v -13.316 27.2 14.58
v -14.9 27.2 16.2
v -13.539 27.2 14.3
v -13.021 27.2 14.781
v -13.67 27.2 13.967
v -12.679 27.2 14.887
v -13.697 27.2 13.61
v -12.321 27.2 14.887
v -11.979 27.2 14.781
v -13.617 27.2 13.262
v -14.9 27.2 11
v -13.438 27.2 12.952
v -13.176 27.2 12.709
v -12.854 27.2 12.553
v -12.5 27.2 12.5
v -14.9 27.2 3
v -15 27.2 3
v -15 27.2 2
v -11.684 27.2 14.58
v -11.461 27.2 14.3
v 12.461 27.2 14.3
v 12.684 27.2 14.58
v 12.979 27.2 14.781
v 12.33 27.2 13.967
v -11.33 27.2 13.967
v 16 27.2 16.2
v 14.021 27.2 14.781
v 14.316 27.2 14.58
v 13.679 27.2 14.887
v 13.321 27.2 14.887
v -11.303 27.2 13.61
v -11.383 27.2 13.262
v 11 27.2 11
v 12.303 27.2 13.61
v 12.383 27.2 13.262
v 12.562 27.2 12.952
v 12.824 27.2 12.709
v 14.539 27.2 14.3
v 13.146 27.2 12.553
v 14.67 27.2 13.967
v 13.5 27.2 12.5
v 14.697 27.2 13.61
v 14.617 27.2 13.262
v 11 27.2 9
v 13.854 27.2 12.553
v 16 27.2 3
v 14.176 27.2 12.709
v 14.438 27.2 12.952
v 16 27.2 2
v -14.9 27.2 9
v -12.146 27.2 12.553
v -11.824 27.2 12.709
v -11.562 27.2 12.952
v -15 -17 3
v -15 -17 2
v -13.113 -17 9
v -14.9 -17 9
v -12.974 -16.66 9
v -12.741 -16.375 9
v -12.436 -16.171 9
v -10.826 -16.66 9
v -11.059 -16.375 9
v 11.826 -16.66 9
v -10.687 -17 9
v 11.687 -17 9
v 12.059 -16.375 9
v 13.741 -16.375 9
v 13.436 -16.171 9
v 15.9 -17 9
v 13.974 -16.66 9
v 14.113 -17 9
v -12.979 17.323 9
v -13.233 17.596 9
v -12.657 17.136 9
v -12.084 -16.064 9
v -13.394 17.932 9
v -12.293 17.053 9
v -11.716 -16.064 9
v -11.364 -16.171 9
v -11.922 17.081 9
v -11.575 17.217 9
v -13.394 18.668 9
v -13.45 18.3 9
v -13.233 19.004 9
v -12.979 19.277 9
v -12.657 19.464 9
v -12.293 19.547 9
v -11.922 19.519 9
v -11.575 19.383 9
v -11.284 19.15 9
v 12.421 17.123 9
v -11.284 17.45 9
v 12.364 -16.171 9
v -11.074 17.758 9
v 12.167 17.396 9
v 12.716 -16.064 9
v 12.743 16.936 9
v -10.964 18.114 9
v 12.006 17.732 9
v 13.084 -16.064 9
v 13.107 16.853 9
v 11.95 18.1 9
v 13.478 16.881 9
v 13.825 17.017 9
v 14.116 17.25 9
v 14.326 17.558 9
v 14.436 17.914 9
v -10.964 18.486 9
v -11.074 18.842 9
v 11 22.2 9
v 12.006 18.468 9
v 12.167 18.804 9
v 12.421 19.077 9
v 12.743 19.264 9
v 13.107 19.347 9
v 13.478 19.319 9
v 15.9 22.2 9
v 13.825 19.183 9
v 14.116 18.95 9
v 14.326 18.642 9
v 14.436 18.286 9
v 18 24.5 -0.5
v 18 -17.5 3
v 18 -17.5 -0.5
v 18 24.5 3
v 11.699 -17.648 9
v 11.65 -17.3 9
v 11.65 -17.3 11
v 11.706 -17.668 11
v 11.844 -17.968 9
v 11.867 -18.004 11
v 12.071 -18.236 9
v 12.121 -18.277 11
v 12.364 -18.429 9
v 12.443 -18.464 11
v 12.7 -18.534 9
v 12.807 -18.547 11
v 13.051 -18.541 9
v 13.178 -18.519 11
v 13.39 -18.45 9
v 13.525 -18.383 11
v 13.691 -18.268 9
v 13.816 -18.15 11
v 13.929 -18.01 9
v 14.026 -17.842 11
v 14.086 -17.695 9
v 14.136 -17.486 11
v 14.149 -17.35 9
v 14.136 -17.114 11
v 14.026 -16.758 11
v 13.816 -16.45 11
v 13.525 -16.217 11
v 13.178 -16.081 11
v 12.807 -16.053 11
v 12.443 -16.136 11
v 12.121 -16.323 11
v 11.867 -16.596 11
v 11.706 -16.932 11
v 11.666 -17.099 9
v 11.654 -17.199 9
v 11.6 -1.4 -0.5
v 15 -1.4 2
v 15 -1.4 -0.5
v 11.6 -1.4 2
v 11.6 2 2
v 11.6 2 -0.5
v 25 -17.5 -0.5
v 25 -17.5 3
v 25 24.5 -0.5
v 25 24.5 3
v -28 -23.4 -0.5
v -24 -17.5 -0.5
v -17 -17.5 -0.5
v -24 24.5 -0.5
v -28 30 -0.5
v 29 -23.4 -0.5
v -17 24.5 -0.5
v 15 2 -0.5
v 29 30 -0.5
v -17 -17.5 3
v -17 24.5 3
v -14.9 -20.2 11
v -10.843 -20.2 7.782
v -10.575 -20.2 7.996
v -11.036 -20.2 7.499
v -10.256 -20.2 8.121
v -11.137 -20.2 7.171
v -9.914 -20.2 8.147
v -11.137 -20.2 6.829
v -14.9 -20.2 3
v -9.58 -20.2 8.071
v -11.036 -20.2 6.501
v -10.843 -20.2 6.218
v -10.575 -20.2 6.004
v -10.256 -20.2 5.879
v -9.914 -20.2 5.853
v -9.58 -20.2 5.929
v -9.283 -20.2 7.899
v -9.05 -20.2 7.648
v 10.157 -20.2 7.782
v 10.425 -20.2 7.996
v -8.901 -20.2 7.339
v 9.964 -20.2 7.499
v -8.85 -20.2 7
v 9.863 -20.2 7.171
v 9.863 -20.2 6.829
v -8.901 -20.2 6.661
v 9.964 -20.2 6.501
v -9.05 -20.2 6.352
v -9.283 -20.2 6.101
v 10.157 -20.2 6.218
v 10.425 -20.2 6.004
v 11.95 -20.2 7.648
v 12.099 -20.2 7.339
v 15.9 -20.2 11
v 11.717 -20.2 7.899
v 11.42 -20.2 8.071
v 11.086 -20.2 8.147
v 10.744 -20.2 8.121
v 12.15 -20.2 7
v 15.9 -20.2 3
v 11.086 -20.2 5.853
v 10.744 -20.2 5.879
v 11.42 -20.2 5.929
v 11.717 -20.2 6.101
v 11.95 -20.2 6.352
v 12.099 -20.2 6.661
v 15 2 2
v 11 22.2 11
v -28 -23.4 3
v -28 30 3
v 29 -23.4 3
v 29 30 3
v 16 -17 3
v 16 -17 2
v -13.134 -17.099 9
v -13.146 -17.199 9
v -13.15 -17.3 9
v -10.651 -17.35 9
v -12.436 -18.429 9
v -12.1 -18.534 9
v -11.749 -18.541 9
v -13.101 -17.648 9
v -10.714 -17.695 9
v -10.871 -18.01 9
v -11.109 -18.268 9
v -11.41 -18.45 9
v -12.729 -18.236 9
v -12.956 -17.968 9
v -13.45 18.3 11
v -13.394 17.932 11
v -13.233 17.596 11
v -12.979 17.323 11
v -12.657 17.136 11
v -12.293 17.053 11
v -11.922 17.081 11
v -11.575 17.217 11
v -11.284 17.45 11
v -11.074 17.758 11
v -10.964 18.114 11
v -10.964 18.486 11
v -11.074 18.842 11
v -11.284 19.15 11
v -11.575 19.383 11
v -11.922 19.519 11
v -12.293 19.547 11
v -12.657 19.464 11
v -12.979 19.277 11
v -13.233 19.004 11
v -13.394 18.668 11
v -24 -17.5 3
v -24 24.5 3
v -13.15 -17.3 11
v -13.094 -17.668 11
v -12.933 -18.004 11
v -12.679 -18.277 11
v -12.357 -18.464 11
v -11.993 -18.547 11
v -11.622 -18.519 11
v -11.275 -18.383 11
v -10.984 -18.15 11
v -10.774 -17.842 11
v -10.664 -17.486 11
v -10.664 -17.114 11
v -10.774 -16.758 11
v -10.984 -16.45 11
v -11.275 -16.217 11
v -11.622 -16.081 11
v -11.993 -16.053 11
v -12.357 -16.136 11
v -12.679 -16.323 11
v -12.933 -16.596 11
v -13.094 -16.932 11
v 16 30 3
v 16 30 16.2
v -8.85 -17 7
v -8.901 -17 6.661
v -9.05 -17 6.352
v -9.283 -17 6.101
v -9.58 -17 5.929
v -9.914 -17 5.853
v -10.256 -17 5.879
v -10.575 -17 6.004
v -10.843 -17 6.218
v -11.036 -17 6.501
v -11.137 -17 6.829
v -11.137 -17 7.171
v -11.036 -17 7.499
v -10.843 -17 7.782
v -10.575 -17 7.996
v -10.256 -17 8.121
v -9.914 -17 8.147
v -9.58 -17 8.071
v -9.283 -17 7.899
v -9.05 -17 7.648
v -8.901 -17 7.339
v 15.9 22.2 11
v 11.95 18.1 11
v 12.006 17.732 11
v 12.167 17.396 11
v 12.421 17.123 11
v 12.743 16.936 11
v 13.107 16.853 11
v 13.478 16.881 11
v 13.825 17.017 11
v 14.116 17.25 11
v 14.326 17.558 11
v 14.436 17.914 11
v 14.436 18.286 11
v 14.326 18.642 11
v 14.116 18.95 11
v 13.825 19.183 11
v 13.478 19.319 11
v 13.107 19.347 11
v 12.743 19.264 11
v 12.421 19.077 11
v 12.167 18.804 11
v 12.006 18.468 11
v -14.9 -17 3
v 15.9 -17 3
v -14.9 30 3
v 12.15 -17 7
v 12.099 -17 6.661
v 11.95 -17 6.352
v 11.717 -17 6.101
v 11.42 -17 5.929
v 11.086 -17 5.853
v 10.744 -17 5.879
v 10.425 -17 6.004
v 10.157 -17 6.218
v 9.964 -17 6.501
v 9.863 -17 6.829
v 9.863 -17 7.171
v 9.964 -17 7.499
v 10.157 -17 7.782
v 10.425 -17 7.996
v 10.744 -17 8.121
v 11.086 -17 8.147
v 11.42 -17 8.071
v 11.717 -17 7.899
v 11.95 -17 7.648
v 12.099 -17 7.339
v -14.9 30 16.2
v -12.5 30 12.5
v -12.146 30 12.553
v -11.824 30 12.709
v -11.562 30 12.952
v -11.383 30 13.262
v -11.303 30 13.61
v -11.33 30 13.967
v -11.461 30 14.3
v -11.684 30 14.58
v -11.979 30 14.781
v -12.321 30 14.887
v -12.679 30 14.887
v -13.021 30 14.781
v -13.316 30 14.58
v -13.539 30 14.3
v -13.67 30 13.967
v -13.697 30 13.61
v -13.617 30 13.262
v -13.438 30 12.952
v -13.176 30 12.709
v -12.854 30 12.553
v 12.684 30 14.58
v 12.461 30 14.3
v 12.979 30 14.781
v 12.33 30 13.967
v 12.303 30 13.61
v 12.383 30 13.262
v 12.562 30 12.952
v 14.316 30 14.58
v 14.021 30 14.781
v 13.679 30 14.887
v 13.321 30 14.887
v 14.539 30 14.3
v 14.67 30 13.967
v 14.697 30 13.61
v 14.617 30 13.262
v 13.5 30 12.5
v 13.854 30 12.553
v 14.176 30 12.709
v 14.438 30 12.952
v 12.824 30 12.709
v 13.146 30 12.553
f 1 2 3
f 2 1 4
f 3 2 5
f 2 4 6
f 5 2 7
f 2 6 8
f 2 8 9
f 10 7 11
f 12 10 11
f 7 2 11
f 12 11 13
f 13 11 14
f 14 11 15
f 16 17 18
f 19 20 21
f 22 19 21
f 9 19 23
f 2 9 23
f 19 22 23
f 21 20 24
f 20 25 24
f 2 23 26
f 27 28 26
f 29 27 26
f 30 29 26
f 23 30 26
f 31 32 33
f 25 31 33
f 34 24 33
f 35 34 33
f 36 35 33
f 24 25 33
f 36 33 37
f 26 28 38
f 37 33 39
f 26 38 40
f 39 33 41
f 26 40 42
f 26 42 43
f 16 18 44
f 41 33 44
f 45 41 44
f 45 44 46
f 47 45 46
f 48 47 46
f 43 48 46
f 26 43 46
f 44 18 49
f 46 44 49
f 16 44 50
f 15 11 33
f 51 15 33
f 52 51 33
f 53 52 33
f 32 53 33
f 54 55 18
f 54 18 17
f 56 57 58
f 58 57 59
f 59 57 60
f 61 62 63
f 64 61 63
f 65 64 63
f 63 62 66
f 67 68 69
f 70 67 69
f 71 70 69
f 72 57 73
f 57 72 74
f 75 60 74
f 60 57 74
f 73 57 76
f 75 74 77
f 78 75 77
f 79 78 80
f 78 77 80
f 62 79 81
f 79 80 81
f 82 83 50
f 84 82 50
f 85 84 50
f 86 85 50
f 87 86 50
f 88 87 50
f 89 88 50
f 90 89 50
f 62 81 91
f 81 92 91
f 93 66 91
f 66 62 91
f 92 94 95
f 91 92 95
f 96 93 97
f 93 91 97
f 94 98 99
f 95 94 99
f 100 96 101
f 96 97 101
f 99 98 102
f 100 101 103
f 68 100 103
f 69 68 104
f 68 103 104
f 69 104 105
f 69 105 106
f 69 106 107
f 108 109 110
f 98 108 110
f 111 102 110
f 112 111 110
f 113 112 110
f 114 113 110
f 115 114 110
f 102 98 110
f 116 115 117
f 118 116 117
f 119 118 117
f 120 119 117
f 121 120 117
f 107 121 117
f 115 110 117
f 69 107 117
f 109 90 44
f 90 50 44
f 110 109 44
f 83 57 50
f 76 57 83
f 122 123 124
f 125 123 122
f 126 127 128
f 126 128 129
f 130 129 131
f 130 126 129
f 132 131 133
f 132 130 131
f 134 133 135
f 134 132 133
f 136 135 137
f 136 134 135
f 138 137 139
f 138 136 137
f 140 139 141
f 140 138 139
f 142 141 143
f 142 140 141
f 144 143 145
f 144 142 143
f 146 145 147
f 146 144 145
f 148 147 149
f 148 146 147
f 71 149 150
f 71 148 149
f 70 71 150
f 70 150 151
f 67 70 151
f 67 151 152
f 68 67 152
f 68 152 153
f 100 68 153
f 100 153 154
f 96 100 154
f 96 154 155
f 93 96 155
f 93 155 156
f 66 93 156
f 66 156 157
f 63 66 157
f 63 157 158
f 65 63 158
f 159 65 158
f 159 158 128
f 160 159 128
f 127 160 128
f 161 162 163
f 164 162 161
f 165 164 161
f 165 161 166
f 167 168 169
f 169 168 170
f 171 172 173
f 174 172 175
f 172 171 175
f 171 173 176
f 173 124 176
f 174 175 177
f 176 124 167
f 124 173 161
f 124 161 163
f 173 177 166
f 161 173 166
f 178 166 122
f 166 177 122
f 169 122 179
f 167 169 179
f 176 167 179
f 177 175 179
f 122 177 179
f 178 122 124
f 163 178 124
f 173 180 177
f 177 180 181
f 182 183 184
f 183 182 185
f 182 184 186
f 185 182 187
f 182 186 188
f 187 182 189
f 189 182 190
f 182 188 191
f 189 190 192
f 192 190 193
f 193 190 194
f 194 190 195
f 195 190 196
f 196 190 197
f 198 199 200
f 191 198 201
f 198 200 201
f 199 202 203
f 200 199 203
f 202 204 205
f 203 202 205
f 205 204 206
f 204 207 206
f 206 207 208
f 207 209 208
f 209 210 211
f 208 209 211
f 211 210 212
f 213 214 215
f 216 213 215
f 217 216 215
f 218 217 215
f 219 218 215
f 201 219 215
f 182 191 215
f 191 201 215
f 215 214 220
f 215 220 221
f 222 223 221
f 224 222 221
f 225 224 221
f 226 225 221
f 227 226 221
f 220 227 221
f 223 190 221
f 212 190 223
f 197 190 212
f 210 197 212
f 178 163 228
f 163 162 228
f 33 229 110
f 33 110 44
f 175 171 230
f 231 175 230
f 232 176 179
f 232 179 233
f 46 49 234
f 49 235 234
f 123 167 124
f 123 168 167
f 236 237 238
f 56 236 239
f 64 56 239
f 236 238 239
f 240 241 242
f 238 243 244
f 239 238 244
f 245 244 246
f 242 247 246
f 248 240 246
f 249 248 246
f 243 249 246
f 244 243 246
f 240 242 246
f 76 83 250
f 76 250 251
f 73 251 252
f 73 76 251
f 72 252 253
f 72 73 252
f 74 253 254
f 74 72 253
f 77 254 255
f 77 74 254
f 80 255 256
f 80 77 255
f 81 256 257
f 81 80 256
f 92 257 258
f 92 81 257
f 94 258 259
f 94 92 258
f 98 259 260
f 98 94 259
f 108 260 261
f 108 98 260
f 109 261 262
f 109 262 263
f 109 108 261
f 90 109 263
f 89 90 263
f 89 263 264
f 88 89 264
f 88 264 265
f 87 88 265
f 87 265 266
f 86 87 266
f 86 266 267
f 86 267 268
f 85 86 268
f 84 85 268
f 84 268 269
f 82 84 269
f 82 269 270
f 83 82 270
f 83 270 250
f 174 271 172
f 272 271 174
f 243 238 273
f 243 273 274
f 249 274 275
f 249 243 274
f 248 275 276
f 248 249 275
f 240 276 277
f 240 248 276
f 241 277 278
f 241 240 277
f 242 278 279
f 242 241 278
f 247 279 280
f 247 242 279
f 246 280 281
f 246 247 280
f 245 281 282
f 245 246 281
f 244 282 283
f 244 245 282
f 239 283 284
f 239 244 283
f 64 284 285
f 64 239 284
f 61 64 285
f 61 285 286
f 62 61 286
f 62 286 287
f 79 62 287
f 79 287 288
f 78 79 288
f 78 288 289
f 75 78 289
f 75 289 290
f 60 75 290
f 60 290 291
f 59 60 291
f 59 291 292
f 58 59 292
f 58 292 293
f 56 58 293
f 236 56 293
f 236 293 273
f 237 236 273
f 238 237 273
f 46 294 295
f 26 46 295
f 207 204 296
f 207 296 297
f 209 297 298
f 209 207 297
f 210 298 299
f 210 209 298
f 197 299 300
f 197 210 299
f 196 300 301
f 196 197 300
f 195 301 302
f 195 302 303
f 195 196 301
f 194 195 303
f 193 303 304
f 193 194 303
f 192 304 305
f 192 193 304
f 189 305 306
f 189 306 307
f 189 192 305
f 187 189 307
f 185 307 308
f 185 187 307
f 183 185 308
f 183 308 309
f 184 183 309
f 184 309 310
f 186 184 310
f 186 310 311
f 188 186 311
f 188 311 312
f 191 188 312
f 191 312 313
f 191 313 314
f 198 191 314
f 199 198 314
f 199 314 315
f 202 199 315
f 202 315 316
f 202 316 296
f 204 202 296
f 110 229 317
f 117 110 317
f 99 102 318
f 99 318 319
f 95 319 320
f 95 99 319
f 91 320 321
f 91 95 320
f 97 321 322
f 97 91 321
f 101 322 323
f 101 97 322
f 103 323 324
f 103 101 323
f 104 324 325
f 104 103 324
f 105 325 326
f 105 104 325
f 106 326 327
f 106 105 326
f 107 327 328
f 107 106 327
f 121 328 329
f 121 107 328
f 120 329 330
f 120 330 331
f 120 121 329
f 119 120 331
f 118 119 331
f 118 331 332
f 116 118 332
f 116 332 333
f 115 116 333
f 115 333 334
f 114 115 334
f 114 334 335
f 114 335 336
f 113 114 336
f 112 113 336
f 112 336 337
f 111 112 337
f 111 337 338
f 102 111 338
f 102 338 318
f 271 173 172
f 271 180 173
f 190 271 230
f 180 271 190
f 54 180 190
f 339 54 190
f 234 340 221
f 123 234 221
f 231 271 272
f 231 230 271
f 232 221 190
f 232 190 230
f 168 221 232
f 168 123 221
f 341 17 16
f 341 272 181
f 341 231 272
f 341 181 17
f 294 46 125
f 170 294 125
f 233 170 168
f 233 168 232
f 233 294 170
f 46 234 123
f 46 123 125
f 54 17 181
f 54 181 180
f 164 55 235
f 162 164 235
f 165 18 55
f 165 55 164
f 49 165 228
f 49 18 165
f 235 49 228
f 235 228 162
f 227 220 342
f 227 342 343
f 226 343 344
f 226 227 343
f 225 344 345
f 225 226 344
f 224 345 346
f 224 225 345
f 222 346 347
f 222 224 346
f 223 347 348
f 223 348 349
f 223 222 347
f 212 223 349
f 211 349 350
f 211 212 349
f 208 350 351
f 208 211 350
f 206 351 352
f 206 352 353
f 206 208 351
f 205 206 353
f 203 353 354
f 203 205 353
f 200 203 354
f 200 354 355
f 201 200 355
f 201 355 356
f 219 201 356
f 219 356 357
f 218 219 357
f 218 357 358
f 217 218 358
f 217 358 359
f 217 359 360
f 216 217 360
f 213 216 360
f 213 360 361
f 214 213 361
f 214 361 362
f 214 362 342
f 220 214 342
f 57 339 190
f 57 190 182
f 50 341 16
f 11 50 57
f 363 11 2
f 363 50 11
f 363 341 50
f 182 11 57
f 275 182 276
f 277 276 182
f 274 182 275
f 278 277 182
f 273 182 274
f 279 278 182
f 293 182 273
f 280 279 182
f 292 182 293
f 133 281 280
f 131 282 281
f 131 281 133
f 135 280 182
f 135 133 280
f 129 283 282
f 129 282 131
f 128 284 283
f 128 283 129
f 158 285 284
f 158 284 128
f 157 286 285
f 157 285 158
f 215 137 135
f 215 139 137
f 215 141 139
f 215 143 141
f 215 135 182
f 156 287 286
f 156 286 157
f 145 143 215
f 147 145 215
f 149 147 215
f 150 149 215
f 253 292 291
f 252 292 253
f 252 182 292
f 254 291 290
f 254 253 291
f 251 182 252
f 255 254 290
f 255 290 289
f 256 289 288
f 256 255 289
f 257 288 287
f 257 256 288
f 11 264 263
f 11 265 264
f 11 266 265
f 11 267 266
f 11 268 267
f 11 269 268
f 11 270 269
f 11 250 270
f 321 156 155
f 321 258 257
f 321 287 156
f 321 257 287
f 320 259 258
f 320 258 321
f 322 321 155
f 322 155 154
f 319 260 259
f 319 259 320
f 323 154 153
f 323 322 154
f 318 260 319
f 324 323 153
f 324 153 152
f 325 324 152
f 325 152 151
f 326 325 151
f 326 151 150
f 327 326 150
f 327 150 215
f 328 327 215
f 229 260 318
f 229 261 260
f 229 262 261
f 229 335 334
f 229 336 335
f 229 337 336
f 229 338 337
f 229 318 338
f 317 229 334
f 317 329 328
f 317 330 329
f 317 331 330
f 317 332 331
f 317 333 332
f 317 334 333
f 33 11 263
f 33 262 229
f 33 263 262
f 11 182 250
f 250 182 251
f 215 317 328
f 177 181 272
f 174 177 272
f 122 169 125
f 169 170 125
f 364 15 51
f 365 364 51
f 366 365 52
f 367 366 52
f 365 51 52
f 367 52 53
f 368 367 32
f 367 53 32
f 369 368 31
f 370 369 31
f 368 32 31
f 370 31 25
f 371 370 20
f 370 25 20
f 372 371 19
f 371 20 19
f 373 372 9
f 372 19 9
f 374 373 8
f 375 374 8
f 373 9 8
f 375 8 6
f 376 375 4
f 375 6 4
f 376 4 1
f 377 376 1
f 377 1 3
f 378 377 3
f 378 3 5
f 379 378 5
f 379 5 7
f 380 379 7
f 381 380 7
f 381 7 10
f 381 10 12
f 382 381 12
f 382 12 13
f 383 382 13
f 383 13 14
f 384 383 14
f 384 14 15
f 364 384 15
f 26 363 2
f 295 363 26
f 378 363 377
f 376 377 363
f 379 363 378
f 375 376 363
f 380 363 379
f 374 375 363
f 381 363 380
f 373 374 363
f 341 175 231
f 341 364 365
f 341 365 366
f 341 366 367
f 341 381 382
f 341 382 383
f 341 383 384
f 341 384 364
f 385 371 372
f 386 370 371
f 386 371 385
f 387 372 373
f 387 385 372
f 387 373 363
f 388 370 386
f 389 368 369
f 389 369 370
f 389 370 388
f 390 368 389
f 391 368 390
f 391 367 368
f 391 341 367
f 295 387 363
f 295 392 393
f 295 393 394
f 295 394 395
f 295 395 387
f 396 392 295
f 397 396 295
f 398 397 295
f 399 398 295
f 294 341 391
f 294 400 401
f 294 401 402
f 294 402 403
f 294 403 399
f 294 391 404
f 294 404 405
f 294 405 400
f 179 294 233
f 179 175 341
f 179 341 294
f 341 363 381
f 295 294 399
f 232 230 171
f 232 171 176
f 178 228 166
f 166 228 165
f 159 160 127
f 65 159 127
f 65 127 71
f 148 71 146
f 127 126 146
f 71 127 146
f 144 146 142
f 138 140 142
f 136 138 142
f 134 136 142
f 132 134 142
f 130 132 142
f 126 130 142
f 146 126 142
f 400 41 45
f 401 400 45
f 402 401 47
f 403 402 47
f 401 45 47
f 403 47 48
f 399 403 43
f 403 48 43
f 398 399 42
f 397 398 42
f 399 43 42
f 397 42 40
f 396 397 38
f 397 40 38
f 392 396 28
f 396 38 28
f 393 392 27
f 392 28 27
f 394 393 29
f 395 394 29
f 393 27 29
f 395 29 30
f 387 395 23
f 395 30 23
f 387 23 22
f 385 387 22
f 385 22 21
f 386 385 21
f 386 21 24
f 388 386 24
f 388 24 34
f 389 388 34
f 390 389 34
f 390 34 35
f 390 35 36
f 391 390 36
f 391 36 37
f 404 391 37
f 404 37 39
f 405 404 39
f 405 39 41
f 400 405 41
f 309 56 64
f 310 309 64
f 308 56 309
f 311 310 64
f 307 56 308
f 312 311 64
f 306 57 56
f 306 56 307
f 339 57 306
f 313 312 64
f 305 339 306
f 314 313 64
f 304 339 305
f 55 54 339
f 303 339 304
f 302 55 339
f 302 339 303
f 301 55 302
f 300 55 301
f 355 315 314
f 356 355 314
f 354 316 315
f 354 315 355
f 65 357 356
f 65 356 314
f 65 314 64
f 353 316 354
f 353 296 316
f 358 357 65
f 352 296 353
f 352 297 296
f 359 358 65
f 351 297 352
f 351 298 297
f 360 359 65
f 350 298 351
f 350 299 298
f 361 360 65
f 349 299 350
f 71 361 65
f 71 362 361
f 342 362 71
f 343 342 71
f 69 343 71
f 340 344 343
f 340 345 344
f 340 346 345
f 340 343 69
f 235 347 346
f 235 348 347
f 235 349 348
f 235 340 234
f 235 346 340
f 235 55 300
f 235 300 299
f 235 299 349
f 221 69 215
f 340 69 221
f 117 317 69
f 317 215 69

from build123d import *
from build123d.topology import SkipClean

# Parameters (mm, degrees)
SKETCH_1_W            = 57
SKETCH_1_H            = 51
SKETCH_1_W_2          = 3.4
SKETCH_1_H_2          = 3.4
SKETCH_1_W_3          = 7
SKETCH_1_H_3          = 42
EXTRUDE_1_DEPTH       = 3
SKETCH_2_W            = 31
SKETCH_2_H            = 47
CUT_EXTRUDE_1_DEPTH   = 1
SKETCH_5_W            = 57
SKETCH_5_H            = 3
EXTRUDE_2_DEPTH       = 1
SKETCH_6_W            = 57
SKETCH_6_H            = 3
EXTRUDE_3_DEPTH       = 1
SKETCH_7_W            = 10
SKETCH_7_H            = 3
EXTRUDE_4_DEPTH       = 6
SKETCH_8_W            = 31
SKETCH_8_H            = 3
EXTRUDE_5_DEPTH       = 6
CUT_EXTRUDE_3_REACH   = 63.082
SKETCH_9_R            = 1.15
EXTRUDE_6_OUTLINE_W   = 57
EXTRUDE_6_OUTLINE_H   = 53
EXTRUDE_6_OUTLINE_W_2 = 3.4
EXTRUDE_6_OUTLINE_H_2 = 3.4
EXTRUDE_6_OUTLINE_W_3 = 7
EXTRUDE_6_OUTLINE_H_3 = 42
EXTRUDE_6_DEPTH       = 0.5
EXTRUDE_7_DEPTH       = 0.2
EXTRUDE_START         = 0.2
SKETCH_14_R           = 1.15
EXTRUDE_8_DEPTH       = 0.2
CUT_EXTRUDE_START     = -0.2
SKETCH_15_R           = 1.15
CUT_EXTRUDE_5_DEPTH   = 0.2
CUT_EXTRUDE_6_DEPTH   = 0.2
SKETCH_17_W           = 31
SKETCH_17_H           = 3
EXTRUDE_9_DEPTH       = 5
SKETCH_18_W           = 31
SKETCH_18_H           = 2
EXTRUDE_10_DEPTH      = 50.4
SKETCH_3_R            = 1.25
CUT_EXTRUDE_7_DEPTH   = 9
EXTRUDE_START_2       = -0.2
EXTRUDE_11_OUTLINE_R  = 1.15
EXTRUDE_11_DEPTH      = 3.2
SKETCH_22_W           = 31
SKETCH_22_H           = 6
CUT_EXTRUDE_10_DEPTH  = 3
SKETCH_17_2_W         = 31
SKETCH_17_2_H         = 3
EXTRUDE_12_DEPTH      = 7.2
SKETCH_24_W           = 31
SKETCH_24_H           = 2
CUT_EXTRUDE_11_DEPTH  = 3
SKETCH_25_R           = 1.2
CUT_EXTRUDE_12_DEPTH  = 3
SKETCH_27_W           = 11
SKETCH_27_H           = 3.2
EXTRUDE_13_DEPTH      = 6
CUT_EXTRUDE_13_REACH  = 45.42
SKETCH_28_W           = 5
SKETCH_28_H           = 5
SKETCH_31_W           = 64.96263637
SKETCH_31_H           = 23.079945777
CUT_EXTRUDE_14_DEPTH  = 0.2
SKETCH_32_W           = 57
SKETCH_32_H           = 3.5
EXTRUDE_14_DEPTH      = 0.2
CUT_EXTRUDE_15_DEPTH  = 0.1
CUT_EXTRUDE_16_DEPTH  = 0.1


# Read off the part's stored shape, not the designer's step: 凸台-拉伸6, 凸台-拉伸11
with BuildPart() as part:
    # 草图1 → 凸台-拉伸1 (new body)
    with BuildSketch(Plane.XY):
        with Locations((0.5, 3.5)):
            Rectangle(SKETCH_1_W, SKETCH_1_H)
        with Locations((13.3, 0.3)):
            Rectangle(SKETCH_1_W_2, SKETCH_1_H_2, mode=Mode.SUBTRACT)
        with Locations((21.5, 3.5)):
            Rectangle(SKETCH_1_W_3, SKETCH_1_H_3, mode=Mode.SUBTRACT)
        with Locations((-20.5, 3.5)):
            Rectangle(SKETCH_1_W_3, SKETCH_1_H_3, mode=Mode.SUBTRACT)
    extrude(amount=EXTRUDE_1_DEPTH)

    # 草图2 → 切除-拉伸1 (cut)
    with BuildSketch(Plane.XY.offset(3)):
        with Locations((0.5, 3.5)):
            Rectangle(SKETCH_2_W, SKETCH_2_H)
    extrude(amount=-CUT_EXTRUDE_1_DEPTH, mode=Mode.SUBTRACT)

    # 草图5 → 凸台-拉伸2 (add)
    with BuildSketch(Plane(origin=(0, 29, 0), x_dir=(1, 0, 0), z_dir=(0, 1, 0))):
        with Locations((0.5, -1.5)):
            Rectangle(SKETCH_5_W, SKETCH_5_H)
    extrude(amount=EXTRUDE_2_DEPTH)

    # 草图6 → 凸台-拉伸3 (add)
    with BuildSketch(Plane(origin=(0, -22, 0), x_dir=(-1, 0, 0), z_dir=(0, -1, 0))):
        with Locations((-0.5, -1.5)):
            Rectangle(SKETCH_6_W, SKETCH_6_H)
    extrude(amount=EXTRUDE_3_DEPTH)

    # 草图7 → 凸台-拉伸4 (add)
    with BuildSketch(Plane.XY.offset(3)):
        with Locations((-10, -21.5)):
            Rectangle(SKETCH_7_W, SKETCH_7_H)
        with Locations((11, -21.5)):
            Rectangle(SKETCH_7_W, SKETCH_7_H)
    extrude(amount=EXTRUDE_4_DEPTH)

    # 草图8 → 凸台-拉伸5 (add)
    with BuildSketch(Plane.XY.offset(3)):
        with Locations((0.5, 28.5)):
            Rectangle(SKETCH_8_W, SKETCH_8_H)
    extrude(amount=EXTRUDE_5_DEPTH)

    # 草图9 → 切除-拉伸3 (cut, up to next)
    with BuildSketch(Plane.XZ.offset(23), mode=Mode.PRIVATE) as cut_extrude_3_sk1:
        with Locations(Location((-10, 7, 0), (0, 0, 270))):
            Circle(SKETCH_9_R)
    cut_extrude_3_tool1 = extrude(cut_extrude_3_sk1.sketch, amount=-CUT_EXTRUDE_3_REACH, mode=Mode.PRIVATE) & part.part
    # 草图9 → 切除-拉伸3 (cut, up to next)
    with BuildSketch(Plane.XZ.offset(23), mode=Mode.PRIVATE) as cut_extrude_3_sk2:
        with Locations(Location((11, 7, 0), (0, 0, 270))):
            Circle(SKETCH_9_R)
    cut_extrude_3_tool2 = extrude(cut_extrude_3_sk2.sketch, amount=-CUT_EXTRUDE_3_REACH, mode=Mode.PRIVATE) & part.part
    add(cut_extrude_3_tool1.solids().sort_by_distance((-10, -23, 7))[0], mode=Mode.SUBTRACT)
    add(cut_extrude_3_tool2.solids().sort_by_distance((11, -23, 7))[0], mode=Mode.SUBTRACT)

    # 凸台-拉伸6 outline → 凸台-拉伸6 (add)
    with BuildSketch(Plane(origin=(0, 0, 0), x_dir=(-1, 0, 0), z_dir=(0, 0, -1))):
        with Locations((-0.5, 3.5)):
            Rectangle(EXTRUDE_6_OUTLINE_W, EXTRUDE_6_OUTLINE_H)
        with Locations((-13.3, 0.3)):
            Rectangle(EXTRUDE_6_OUTLINE_W_2, EXTRUDE_6_OUTLINE_H_2, mode=Mode.SUBTRACT)
        with Locations((-21.5, 3.5)):
            Rectangle(EXTRUDE_6_OUTLINE_W_3, EXTRUDE_6_OUTLINE_H_3, mode=Mode.SUBTRACT)
        with Locations((20.5, 3.5)):
            Rectangle(EXTRUDE_6_OUTLINE_W_3, EXTRUDE_6_OUTLINE_H_3, mode=Mode.SUBTRACT)
    extrude(amount=EXTRUDE_6_DEPTH)

    # 草图13 → 凸台-拉伸7 (add)
    with BuildSketch(Plane(origin=(0, 30, 0), x_dir=(1, 0, 0), z_dir=(0, 1, 0))):
        Polygon((16, -3), (29, -3), (29, 0.5), (-28, 0.5), (-28, -3), (-15, -3), (-15, -9), (16, -9), align=None)
    extrude(amount=EXTRUDE_7_DEPTH)

    # 草图14 → 凸台-拉伸8 (add)
    with BuildSketch(Plane(origin=(0, -23, 0), x_dir=(-1, 0, 0), z_dir=(0, -1, 0)).offset(EXTRUDE_START)):
        Polygon((-29, 0.5), (-29, -3), (-16, -3), (-16, -9), (-6, -9), (-6, -3), (5, -3), (5, -9), (15, -9), (15, -3), (28, -3), (28, 0.5), align=None)
        with Locations(Location((-11, -7, 0), (0, 0, 90))):
            Circle(SKETCH_14_R, mode=Mode.SUBTRACT)
        with Locations(Location((10, -7, 0), (0, 0, 90))):
            Circle(SKETCH_14_R, mode=Mode.SUBTRACT)
    extrude(amount=-EXTRUDE_8_DEPTH)

    # 草图15 → 切除-拉伸5 (cut)
    with BuildSketch(Plane(origin=(0, -20, 0), x_dir=(1, 0, 0), z_dir=(0, 1, 0)).offset(CUT_EXTRUDE_START)):
        Polygon((16, -2), (-15, -2), (-15, -3), (-15, -9), (-5, -9), (-5, -3), (6, -3), (6, -9), (16, -9), (16, -3), align=None)
        with Locations(Location((11, -7, 0), (0, 0, 90))):
            Circle(SKETCH_15_R, mode=Mode.SUBTRACT)
        with Locations(Location((-10, -7, 0), (0, 0, 90))):
            Circle(SKETCH_15_R, mode=Mode.SUBTRACT)
    extrude(amount=CUT_EXTRUDE_5_DEPTH, mode=Mode.SUBTRACT)

    # 草图16 → 切除-拉伸6 (cut)
    with BuildSketch(Plane.XZ.offset(-27)):
        Polygon((-15, 2), (16, 2), (16, 3), (16, 9), (-15, 9), (-15, 3), align=None)
    extrude(amount=-CUT_EXTRUDE_6_DEPTH, mode=Mode.SUBTRACT)

    # 草图17 → 凸台-拉伸9 (add)
    with BuildSketch(Plane.XY.offset(9)):
        with Locations((0.5, 28.7)):
            Rectangle(SKETCH_17_W, SKETCH_17_H)
    extrude(amount=EXTRUDE_9_DEPTH)

    # 草图18 → 凸台-拉伸10 (add)
    with BuildSketch(Plane.XZ.offset(-27.2)):
        with Locations((0.5, 10)):
            Rectangle(SKETCH_18_W, SKETCH_18_H)
    extrude(amount=EXTRUDE_10_DEPTH)

    # 草图3 → 切除-拉伸7 (cut)
    with BuildSketch(Plane.XY.offset(2)):
        with Locations(Location((-12.2, 18.3, 0), (0, 0, 180))):
            Circle(SKETCH_3_R)
        with Locations(Location((13.2, 18.1, 0), (0, 0, 180))):
            Circle(SKETCH_3_R)
        with Locations(Location((12.9, -17.3, 0), (0, 0, 180))):
            Circle(SKETCH_3_R)
        with Locations(Location((-11.9, -17.3, 0), (0, 0, 180))):
            Circle(SKETCH_3_R)
    extrude(amount=CUT_EXTRUDE_7_DEPTH, mode=Mode.SUBTRACT)

    # 凸台-拉伸11 outline → 凸台-拉伸11 (add)
    with SkipClean():  # the faces are left unmerged after this step: merging them gives an invalid solid
        with BuildSketch(Plane(origin=(0, -20, 0), x_dir=(1, 0, 0), z_dir=(0, 1, 0)).offset(EXTRUDE_START_2)):
            Polygon((-5, -9), (-5, -3), (6, -3), (6, -9), (16, -9), (16, -2), (-15, -2), (-15, -9), align=None)
            with Locations((-10, -7)):
                Circle(EXTRUDE_11_OUTLINE_R, mode=Mode.SUBTRACT)
            with Locations((11, -7)):
                Circle(EXTRUDE_11_OUTLINE_R, mode=Mode.SUBTRACT)
        extrude(amount=EXTRUDE_11_DEPTH)

    # 草图22 → 切除-拉伸10 (cut)
    with BuildSketch(Plane(origin=(0, -23.2, 0), x_dir=(-1, 0, 0), z_dir=(0, -1, 0))):
        with Locations((-0.5, -6)):
            Rectangle(SKETCH_22_W, SKETCH_22_H)
    extrude(amount=-CUT_EXTRUDE_10_DEPTH, mode=Mode.SUBTRACT)

    # 草图17<2> → 凸台-拉伸12 (add)
    with BuildSketch(Plane.XY.offset(9)):
        with Locations((0.5, 28.7)):
            Rectangle(SKETCH_17_2_W, SKETCH_17_2_H)
    extrude(amount=EXTRUDE_12_DEPTH)

    # 草图24 → 切除-拉伸11 (cut)
    with BuildSketch(Plane.XZ.offset(23.2)):
        with Locations((0.5, 10)):
            Rectangle(SKETCH_24_W, SKETCH_24_H)
    extrude(amount=-CUT_EXTRUDE_11_DEPTH, mode=Mode.SUBTRACT)

    # 草图25 → 切除-拉伸12 (cut)
    with BuildSketch(Plane.XZ.offset(-27.2)):
        with Locations(Location((-12.5, 13.7, 0), (0, 0, 270))):
            Circle(SKETCH_25_R)
        with Locations(Location((13.5, 13.7, 0), (0, 0, 270))):
            Circle(SKETCH_25_R)
    extrude(amount=-CUT_EXTRUDE_12_DEPTH, mode=Mode.SUBTRACT)

    # 草图27 → 凸台-拉伸13 (add)
    with BuildSketch(Plane.XY.offset(3)):
        with Locations((0.5, -18.6)):
            Rectangle(SKETCH_27_W, SKETCH_27_H)
    extrude(amount=EXTRUDE_13_DEPTH)

    # 草图28 → 切除-拉伸13 (cut, up to next)
    with BuildSketch(Plane.XY.offset(11), mode=Mode.PRIVATE) as cut_extrude_13_sk1:
        with Locations((13.5, 24.7)):
            Rectangle(SKETCH_28_W, SKETCH_28_H)
    cut_extrude_13_tool1 = extrude(cut_extrude_13_sk1.sketch, amount=-CUT_EXTRUDE_13_REACH, mode=Mode.PRIVATE) & part.part
    add(cut_extrude_13_tool1.solids().sort_by_distance((13.5, 24.7, 11))[0], mode=Mode.SUBTRACT)

    # 草图31 → 切除-拉伸14 (cut)
    with BuildSketch(Plane(origin=(0, 30.2, 0), x_dir=(1, 0, 0), z_dir=(0, 1, 0))):
        with Locations((-0.558713109, -6.113710501)):
            Rectangle(SKETCH_31_W, SKETCH_31_H)
    extrude(amount=-CUT_EXTRUDE_14_DEPTH, mode=Mode.SUBTRACT)

    # 草图32 → 凸台-拉伸14 (add)
    with BuildSketch(Plane.XZ.offset(23.2)):
        with Locations((0.5, 1.25)):
            Rectangle(SKETCH_32_W, SKETCH_32_H)
    extrude(amount=EXTRUDE_14_DEPTH)

    # 草图33 → 切除-拉伸15 (cut)
    with BuildSketch(Plane.ZY.offset(15)):
        Polygon((16.2, 27.2), (16.2, 30), (3, 30), (3, 27.2), (9, 27.2), (9, -17), (3, -17), (3, -20.2), (11, -20.2), (11, 27.2), align=None)
    extrude(amount=-CUT_EXTRUDE_15_DEPTH, mode=Mode.SUBTRACT)

    # 草图34 → 切除-拉伸16 (cut)
    with BuildSketch(Plane(origin=(16, 0, 0), x_dir=(0, 0, -1), z_dir=(1, 0, 0))):
        Polygon((-3, -17), (-9, -17), (-9, 22.2), (-11, 22.2), (-11, -20.2), (-3, -20.2), align=None)
    extrude(amount=-CUT_EXTRUDE_16_DEPTH, mode=Mode.SUBTRACT)


solid = part.part
